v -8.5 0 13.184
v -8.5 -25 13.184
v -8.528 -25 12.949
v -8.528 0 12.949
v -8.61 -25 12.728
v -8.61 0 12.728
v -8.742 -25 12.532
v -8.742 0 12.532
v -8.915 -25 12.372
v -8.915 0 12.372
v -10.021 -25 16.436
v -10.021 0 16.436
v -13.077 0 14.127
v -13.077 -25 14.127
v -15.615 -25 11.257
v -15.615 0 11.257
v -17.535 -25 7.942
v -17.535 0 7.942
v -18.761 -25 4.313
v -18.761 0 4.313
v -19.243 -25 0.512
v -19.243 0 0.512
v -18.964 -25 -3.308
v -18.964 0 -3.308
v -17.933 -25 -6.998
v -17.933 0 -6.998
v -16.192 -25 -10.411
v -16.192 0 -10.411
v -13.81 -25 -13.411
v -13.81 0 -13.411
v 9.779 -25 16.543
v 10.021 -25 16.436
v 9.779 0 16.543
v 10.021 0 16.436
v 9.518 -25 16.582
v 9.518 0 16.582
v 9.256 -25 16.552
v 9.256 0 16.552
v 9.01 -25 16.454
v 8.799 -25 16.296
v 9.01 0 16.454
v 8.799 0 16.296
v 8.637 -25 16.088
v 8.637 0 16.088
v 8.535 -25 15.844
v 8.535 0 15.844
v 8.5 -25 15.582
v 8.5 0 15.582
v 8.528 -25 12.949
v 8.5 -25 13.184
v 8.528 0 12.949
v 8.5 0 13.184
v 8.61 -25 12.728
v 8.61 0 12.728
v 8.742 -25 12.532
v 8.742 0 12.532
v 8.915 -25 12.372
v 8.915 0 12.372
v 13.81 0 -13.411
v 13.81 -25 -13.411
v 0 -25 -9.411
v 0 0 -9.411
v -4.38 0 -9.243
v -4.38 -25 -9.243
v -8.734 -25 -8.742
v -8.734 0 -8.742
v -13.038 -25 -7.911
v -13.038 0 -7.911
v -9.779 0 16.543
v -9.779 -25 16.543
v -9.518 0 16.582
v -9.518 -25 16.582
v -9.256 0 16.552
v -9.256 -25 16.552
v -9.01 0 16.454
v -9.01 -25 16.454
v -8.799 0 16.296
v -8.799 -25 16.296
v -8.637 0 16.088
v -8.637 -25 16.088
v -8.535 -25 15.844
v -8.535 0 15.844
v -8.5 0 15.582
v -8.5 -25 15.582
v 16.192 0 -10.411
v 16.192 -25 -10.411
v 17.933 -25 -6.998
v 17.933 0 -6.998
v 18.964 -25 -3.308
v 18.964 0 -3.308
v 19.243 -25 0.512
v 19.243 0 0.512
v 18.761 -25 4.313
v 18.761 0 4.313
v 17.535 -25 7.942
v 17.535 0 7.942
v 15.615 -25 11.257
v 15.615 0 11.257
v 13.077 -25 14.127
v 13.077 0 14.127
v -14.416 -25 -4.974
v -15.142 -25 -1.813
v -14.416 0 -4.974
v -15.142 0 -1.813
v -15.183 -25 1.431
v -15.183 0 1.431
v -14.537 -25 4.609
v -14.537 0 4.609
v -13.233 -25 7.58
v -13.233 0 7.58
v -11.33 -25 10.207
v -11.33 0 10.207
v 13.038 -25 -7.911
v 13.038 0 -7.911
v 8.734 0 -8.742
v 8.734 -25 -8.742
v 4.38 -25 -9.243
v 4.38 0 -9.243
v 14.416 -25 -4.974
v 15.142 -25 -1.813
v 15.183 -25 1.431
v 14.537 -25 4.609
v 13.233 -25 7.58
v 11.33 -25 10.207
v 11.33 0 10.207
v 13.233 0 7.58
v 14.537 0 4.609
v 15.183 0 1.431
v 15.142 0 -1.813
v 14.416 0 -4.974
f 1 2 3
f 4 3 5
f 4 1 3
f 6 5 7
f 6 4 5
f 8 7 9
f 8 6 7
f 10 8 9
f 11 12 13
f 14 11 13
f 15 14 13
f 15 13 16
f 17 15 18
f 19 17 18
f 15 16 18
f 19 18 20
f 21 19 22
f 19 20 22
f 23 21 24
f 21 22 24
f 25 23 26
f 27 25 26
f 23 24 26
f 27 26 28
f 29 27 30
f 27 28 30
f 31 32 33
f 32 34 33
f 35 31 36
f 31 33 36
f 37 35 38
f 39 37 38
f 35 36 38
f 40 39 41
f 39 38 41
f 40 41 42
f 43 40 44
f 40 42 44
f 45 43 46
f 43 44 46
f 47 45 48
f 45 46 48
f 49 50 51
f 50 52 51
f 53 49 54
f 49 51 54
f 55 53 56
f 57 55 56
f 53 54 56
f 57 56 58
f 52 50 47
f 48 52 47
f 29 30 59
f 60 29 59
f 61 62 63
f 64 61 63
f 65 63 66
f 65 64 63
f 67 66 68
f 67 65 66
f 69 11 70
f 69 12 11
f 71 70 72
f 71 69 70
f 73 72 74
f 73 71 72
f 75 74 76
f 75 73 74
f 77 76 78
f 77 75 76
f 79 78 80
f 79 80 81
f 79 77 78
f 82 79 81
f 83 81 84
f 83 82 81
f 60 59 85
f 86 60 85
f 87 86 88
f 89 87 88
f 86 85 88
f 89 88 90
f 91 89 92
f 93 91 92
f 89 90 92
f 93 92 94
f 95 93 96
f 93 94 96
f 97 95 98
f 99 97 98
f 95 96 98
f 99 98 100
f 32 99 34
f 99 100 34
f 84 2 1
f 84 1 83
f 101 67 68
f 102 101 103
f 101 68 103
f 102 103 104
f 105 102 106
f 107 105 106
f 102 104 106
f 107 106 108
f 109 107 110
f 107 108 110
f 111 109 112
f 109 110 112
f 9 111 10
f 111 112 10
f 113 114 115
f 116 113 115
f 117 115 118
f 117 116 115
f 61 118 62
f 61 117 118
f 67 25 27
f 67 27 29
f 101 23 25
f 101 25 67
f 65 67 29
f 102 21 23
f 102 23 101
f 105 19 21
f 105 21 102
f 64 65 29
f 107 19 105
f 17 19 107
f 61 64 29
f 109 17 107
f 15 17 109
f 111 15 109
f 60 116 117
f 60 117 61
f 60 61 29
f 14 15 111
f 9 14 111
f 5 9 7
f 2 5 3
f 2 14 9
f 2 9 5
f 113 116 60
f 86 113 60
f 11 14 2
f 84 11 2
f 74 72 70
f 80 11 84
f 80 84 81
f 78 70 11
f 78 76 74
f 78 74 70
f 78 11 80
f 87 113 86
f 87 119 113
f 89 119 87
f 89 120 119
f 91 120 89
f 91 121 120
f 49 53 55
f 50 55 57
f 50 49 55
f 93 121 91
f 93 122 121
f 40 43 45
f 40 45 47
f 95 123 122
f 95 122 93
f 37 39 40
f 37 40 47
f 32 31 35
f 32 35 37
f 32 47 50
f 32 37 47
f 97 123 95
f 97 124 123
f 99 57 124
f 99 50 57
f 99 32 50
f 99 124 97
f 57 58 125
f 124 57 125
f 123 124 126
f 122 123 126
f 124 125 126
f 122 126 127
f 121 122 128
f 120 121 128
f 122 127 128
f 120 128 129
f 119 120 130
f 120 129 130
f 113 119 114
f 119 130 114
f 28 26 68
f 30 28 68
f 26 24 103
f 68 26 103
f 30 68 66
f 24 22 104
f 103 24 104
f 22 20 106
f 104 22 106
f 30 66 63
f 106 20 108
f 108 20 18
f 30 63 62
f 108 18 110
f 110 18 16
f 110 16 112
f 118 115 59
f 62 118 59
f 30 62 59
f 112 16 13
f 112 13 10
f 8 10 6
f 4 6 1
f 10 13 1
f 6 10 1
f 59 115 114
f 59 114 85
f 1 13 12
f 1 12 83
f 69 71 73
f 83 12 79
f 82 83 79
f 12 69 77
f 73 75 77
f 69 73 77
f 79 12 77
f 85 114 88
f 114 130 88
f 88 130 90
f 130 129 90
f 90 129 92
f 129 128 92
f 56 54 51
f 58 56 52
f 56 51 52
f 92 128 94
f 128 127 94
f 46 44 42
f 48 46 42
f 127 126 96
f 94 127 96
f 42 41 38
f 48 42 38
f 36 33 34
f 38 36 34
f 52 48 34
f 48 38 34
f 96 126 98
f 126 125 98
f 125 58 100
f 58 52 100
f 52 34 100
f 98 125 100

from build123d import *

# Parameters (mm, degrees)
F1_DEPTH = 25
F2_W     = 17
F2_H     = 6.5885427379
F3_DEPTH = 25.001
F4_R     = 1
F6_DEPTH = 25


with BuildPart() as f1:
    # F0 (on Front) → F1 (new body)
    with BuildSketch(Plane.XZ):
        with BuildLine():
            Line((-13.8099195907, -13.4107651124), (13.8099195907, -13.4107651124))
            ThreePointArc((13.8099195907, -13.4107651124), (0, 19.25), (-13.8099195907, -13.4107651124))
        make_face()
        with BuildLine():
            ThreePointArc((-12, -9.4107651124), (0, 15.25), (12, -9.4107651124))
            Line((12, -9.4107651124), (-12, -9.4107651124))
        make_face(mode=Mode.SUBTRACT)
    extrude(amount=F1_DEPTH)

    # F2 (on face) → F3 (cut, through all)
    with BuildSketch(Plane.XZ.offset(25)):
        with Locations((0, 15.9557286311)):
            Rectangle(F2_W, F2_H)
    extrude(amount=-F3_DEPTH, mode=Mode.SUBTRACT)

    # F4
    f4_edges = [f1.edges().sort_by_distance(p)[0] for p in [
        (-8.5, -12.5, 17.271725),
        (-8.5, -12.5, 12.661457),
        (8.5, -12.5, 17.271725),
        (8.5, -12.5, 12.661457),
    ]]
    fillet(f4_edges, radius=F4_R)

    # F5 (on face) → F6 (join, through all)
    with BuildSketch(Plane.XZ.offset(25)):
        with BuildLine():
            ThreePointArc((13.0377258499, -7.9107651124), (6.5618652017, -9.0345323104), (1.674e-07, -9.4107651124))
            Line((1.674e-07, -9.4107651124), (12, -9.4107651124))
            ThreePointArc((12, -9.4107651124), (12.5413089003, -8.6762936249), (13.0377258499, -7.9107651124))
        make_face()
        with BuildLine():
            ThreePointArc((1.674e-07, -9.4107651124), (-6.5618650354, -9.0345323295), (-13.0377258499, -7.9107651124))
            ThreePointArc((-13.0377258499, -7.9107651124), (-12.5413089003, -8.6762936249), (-12, -9.4107651124))
            Line((-12, -9.4107651124), (1.674e-07, -9.4107651124))
        make_face()
    extrude(amount=-F6_DEPTH)


solid = f1.part
